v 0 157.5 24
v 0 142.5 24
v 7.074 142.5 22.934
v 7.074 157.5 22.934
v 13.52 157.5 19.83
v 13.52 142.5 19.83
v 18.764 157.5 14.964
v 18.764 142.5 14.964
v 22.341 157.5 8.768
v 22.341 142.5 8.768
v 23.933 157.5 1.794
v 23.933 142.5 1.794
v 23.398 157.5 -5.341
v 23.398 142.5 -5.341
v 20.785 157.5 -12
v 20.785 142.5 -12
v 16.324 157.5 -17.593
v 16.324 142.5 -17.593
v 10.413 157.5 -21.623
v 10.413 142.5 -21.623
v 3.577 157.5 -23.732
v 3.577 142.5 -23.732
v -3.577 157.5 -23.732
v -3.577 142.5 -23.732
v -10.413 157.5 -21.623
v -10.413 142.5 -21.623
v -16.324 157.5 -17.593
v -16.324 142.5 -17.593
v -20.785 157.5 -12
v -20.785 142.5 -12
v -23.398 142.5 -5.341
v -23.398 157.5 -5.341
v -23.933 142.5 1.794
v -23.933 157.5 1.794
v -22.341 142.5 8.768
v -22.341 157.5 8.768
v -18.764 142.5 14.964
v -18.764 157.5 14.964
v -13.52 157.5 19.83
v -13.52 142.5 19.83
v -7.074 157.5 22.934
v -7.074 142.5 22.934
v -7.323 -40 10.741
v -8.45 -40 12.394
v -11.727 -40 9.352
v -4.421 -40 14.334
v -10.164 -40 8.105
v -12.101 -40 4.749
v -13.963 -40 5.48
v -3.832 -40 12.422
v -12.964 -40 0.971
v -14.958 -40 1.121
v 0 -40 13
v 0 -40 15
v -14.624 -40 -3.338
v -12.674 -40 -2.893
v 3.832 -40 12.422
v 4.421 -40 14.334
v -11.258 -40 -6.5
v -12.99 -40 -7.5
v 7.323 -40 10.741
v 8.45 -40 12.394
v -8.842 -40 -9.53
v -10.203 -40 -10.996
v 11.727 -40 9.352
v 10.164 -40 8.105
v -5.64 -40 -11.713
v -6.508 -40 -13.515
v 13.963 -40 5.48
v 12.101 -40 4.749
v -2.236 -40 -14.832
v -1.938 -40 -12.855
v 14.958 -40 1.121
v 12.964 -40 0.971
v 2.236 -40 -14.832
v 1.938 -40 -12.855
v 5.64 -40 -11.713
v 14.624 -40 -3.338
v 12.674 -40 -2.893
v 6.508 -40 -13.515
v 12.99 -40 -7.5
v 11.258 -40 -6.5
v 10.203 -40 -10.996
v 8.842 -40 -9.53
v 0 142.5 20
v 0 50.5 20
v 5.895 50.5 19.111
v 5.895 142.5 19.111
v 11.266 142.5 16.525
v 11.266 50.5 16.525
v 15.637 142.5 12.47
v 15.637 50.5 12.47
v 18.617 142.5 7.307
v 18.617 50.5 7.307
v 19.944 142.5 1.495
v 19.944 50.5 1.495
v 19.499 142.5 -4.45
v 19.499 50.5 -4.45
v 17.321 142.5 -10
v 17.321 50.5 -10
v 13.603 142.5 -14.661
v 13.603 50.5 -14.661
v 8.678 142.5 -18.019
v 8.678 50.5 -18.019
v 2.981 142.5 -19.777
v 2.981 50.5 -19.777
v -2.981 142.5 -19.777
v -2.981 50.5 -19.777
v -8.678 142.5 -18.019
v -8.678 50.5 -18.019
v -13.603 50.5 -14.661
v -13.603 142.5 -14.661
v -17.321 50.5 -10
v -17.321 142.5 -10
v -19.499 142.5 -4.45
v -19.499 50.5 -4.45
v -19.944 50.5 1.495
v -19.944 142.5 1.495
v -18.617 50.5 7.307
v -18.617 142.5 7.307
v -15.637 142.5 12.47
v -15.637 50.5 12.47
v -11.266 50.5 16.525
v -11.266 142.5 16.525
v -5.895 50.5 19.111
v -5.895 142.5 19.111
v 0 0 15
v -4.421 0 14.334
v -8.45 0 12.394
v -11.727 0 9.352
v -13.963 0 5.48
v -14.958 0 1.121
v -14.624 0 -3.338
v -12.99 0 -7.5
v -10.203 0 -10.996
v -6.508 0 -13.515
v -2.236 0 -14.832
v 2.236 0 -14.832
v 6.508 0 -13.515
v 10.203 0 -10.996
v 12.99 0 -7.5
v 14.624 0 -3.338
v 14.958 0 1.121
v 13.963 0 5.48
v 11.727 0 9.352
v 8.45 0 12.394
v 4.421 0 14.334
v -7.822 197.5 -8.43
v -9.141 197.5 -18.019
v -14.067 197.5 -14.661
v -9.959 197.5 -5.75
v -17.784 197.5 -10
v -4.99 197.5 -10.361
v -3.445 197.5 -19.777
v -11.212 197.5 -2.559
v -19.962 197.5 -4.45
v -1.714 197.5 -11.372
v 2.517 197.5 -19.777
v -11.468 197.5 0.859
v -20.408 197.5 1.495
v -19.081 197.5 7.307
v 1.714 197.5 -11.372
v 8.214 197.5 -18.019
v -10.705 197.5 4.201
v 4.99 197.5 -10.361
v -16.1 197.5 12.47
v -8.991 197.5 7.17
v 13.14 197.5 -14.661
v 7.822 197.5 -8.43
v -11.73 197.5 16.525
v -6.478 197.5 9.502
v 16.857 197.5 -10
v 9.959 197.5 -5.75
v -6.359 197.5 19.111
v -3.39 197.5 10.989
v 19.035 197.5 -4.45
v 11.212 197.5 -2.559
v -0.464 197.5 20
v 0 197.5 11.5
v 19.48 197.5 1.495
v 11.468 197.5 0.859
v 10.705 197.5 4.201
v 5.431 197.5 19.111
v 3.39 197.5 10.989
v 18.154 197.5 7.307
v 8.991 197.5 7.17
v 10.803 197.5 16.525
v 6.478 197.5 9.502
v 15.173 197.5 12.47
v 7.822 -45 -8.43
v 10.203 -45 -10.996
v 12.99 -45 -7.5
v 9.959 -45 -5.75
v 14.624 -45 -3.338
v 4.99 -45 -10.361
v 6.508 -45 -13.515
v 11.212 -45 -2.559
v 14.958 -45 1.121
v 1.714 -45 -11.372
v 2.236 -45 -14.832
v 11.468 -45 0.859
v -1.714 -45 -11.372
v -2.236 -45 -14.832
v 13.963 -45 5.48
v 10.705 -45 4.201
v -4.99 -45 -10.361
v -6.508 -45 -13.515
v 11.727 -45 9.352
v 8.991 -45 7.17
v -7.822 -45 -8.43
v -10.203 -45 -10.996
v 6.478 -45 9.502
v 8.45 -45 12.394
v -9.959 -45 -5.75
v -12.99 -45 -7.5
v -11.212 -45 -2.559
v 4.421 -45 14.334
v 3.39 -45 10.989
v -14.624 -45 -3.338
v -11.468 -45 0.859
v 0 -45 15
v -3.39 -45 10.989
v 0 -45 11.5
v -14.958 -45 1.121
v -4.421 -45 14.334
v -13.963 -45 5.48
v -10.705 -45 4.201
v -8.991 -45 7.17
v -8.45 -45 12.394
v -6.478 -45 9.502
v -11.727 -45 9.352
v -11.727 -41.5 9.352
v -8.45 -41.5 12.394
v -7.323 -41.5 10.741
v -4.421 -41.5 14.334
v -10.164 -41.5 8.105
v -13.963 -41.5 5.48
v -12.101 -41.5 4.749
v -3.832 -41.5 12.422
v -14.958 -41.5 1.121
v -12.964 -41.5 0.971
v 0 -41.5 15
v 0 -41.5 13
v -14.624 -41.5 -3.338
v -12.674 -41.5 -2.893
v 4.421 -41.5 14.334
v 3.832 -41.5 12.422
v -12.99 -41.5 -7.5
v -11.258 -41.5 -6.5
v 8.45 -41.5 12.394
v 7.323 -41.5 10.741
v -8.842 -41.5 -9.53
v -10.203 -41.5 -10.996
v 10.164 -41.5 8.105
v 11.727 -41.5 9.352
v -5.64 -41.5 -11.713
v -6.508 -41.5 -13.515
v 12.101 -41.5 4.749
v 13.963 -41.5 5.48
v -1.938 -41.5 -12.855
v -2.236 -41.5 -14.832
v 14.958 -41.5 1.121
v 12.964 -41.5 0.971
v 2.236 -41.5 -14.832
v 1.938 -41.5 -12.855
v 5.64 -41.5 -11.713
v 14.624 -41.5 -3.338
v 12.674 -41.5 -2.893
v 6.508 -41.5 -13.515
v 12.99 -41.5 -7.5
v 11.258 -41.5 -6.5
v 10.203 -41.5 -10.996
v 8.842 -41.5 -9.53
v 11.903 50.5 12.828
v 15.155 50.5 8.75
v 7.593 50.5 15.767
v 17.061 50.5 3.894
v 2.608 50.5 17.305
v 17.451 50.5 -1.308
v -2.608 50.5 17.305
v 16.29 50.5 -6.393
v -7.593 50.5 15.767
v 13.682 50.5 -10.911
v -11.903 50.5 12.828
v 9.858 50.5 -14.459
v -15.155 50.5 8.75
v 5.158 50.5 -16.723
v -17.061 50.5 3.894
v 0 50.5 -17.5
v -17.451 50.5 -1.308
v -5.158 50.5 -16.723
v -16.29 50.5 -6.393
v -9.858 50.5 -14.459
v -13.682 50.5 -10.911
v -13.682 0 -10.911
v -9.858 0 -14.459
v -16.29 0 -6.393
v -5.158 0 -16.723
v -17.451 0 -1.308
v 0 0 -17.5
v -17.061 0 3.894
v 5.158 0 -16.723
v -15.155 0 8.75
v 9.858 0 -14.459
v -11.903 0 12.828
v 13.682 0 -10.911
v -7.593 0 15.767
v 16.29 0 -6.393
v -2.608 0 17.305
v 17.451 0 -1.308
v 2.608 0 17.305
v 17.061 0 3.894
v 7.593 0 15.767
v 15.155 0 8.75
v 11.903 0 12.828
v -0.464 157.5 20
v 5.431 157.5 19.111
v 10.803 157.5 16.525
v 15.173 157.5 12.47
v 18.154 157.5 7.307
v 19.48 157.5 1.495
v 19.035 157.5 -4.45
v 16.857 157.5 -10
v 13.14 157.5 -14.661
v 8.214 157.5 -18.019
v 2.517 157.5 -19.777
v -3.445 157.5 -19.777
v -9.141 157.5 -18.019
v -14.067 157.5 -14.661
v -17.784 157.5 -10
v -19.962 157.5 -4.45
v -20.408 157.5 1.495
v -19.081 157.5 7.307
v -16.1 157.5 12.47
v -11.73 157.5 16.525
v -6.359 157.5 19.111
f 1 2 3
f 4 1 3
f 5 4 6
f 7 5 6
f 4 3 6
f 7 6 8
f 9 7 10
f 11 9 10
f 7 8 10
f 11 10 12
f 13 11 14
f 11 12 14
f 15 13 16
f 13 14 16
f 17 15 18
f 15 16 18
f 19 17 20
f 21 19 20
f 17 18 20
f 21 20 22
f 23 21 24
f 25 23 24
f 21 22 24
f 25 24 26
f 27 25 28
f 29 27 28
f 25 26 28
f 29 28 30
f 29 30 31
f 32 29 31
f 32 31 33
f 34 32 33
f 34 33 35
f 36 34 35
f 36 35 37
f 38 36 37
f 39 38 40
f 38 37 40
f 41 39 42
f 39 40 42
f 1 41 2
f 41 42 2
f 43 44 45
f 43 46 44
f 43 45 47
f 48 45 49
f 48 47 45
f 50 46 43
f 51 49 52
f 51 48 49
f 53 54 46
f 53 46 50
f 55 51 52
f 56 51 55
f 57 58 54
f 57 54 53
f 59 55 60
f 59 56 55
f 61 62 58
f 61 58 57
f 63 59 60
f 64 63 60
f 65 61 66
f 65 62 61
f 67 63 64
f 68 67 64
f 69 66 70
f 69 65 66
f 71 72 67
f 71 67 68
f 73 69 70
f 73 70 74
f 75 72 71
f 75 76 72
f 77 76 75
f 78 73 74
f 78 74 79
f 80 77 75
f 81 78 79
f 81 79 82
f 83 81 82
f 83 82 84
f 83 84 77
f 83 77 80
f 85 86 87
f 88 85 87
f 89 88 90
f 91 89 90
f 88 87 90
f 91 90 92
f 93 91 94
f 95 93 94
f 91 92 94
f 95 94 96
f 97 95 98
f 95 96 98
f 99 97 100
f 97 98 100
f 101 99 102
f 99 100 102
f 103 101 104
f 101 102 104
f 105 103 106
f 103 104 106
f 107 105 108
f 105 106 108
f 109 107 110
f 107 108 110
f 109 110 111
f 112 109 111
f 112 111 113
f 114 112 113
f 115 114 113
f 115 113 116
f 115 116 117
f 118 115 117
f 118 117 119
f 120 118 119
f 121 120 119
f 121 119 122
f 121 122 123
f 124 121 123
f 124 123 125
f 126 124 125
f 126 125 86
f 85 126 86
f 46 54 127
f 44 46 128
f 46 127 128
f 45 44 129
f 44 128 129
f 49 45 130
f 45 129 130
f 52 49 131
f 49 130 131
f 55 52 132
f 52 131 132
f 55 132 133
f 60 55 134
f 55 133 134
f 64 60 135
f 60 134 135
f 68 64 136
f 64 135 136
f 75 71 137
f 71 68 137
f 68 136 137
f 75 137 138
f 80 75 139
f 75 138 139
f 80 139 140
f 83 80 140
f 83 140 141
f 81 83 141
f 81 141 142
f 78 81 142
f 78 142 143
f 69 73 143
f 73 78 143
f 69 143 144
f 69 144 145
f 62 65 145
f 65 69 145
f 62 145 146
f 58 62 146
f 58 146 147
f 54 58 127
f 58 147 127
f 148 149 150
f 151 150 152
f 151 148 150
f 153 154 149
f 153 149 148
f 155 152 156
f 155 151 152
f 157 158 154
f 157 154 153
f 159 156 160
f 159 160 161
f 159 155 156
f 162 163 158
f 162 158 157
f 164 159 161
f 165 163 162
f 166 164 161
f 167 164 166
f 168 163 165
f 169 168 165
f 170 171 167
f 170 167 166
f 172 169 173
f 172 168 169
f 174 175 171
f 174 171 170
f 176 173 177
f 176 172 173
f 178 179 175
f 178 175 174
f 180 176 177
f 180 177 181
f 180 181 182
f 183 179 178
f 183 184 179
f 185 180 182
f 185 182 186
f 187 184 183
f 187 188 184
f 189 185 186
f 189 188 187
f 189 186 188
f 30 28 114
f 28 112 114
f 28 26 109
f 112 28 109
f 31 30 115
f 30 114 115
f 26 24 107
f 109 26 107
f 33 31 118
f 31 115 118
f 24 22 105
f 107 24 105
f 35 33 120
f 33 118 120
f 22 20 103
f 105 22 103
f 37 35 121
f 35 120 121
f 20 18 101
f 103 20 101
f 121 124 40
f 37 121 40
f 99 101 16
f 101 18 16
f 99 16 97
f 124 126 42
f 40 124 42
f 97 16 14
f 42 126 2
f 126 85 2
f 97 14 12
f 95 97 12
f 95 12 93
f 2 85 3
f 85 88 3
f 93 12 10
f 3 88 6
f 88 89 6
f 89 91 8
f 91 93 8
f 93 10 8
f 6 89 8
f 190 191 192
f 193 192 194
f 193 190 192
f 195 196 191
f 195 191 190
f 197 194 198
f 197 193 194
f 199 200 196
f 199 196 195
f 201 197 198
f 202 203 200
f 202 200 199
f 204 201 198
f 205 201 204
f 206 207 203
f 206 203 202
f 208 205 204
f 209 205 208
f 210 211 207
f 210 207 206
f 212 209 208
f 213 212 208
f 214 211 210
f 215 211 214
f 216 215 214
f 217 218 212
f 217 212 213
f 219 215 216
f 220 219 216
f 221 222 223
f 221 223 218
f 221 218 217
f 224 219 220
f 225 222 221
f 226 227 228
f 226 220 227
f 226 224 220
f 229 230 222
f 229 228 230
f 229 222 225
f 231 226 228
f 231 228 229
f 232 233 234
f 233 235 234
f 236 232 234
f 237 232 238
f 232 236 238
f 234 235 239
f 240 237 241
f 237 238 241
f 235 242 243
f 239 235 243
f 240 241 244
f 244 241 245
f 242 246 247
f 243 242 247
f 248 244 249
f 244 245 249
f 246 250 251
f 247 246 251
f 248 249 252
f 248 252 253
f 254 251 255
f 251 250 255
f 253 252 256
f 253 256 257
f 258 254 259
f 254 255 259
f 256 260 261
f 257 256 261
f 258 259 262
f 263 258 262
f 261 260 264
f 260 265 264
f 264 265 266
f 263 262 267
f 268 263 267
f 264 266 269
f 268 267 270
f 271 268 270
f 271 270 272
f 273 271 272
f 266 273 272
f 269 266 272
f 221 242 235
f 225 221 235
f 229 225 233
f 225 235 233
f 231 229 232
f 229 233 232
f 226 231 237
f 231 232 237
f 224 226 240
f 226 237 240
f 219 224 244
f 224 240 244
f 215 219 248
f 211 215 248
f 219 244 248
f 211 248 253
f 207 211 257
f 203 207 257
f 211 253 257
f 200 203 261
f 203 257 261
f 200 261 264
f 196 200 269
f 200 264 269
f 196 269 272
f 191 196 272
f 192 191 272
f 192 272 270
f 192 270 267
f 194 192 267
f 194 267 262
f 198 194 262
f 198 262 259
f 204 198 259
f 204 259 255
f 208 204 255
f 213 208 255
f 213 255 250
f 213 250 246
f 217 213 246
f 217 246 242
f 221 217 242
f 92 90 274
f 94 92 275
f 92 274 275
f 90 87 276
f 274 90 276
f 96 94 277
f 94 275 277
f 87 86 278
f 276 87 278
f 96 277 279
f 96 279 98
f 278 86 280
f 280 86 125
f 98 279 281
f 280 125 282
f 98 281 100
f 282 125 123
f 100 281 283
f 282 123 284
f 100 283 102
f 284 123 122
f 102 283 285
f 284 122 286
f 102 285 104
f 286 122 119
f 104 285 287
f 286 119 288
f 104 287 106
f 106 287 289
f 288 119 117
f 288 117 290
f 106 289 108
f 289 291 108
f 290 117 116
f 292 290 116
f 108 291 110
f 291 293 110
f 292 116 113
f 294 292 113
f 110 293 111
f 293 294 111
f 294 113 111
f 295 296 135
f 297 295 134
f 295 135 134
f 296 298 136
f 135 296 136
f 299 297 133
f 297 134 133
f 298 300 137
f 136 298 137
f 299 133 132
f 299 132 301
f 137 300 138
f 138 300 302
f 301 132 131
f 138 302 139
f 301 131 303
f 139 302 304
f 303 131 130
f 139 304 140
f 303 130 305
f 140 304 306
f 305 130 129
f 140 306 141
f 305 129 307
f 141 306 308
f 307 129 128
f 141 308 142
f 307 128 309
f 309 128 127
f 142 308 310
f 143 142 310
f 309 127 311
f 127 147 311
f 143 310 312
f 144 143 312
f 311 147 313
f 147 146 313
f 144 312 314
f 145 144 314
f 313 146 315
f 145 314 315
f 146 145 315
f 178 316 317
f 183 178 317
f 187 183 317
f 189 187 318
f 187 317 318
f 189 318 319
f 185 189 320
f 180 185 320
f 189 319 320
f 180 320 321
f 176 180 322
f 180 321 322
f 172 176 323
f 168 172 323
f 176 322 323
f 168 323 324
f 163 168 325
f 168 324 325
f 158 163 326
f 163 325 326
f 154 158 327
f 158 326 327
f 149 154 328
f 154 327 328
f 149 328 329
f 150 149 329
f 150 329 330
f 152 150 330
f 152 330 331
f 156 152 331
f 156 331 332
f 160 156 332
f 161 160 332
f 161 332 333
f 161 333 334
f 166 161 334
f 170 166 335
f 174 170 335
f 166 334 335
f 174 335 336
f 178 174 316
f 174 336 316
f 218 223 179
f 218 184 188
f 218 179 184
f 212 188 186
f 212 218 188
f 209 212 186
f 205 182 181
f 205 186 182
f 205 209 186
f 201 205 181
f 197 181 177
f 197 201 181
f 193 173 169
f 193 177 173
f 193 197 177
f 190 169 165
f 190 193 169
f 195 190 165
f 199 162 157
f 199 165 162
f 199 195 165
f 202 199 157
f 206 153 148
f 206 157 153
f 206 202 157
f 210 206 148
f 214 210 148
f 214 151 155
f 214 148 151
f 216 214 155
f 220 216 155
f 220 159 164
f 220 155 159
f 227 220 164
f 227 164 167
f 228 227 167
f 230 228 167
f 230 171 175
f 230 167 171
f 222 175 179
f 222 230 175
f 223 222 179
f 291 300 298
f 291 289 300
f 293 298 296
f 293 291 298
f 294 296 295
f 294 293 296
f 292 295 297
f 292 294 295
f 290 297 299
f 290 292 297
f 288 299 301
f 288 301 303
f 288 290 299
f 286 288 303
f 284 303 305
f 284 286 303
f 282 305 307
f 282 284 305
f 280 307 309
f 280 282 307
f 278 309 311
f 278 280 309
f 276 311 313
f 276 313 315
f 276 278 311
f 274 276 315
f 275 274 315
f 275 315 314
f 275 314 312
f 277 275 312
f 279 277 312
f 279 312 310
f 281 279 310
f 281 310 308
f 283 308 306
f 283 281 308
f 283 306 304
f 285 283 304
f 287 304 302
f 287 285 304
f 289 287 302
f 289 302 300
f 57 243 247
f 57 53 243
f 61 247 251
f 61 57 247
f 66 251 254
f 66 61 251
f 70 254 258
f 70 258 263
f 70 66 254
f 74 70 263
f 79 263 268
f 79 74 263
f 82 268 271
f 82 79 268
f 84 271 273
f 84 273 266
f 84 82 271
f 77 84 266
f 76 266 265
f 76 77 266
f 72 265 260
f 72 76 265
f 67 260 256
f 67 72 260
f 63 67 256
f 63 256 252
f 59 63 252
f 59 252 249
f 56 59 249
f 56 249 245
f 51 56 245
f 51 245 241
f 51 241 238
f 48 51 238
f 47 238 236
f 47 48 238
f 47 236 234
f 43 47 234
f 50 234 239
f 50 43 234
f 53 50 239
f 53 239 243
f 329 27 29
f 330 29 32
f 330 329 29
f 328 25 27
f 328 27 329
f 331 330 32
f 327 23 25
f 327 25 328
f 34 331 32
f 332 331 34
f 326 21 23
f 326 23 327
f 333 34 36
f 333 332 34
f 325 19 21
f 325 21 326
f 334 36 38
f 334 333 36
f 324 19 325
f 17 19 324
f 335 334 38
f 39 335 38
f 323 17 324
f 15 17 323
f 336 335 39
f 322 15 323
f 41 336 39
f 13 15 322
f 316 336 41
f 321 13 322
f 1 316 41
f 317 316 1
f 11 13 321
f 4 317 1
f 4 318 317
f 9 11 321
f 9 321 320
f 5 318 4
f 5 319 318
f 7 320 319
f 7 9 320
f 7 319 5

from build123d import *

# Parameters (mm, degrees)
SKETCH1_R               = 20
BOSS_EXTRUDE1_DEPTH     = 142.5
SKETCH2_R               = 24
BOSS_EXTRUDE2_DEPTH     = 15
SKETCH3_R               = 20
BOSS_EXTRUDE3_DEPTH     = 40
SKETCH5_R               = 15
BOSS_EXTRUDE4_DEPTH     = 45
CUT_EXTRUDE1_DEPTH      = 245.863737617
CUT_EXTRUDE1_DEPTH_BACK = 245.863737617
SKETCH4_R               = 11.5
SKETCH7_W               = 2
SKETCH7_H               = 1.5
SKETCH10_W              = 2.5
SKETCH10_H              = 50.5


with BuildPart() as part:
    # Sketch1 → Boss-Extrude1 (new body)
    with BuildSketch(Plane(origin=(0, 0, 0), x_dir=(1, 0, 0), z_dir=(0, 1, 0))):
        with Locations(Location((0, 0, 0), (0, 0, 270))):
            Circle(SKETCH1_R)
    extrude(amount=BOSS_EXTRUDE1_DEPTH)

    # Sketch2 → Boss-Extrude2 (add)
    with BuildSketch(Plane(origin=(0, 142.5, 0), x_dir=(1, 0, 0), z_dir=(0, 1, 0))):
        with Locations(Location((0, 0, 0), (0, 0, 270))):
            Circle(SKETCH2_R)
    extrude(amount=BOSS_EXTRUDE2_DEPTH)

    # Sketch3 → Boss-Extrude3 (add)
    with BuildSketch(Plane(origin=(0, 157.5, 0), x_dir=(1, 0, 0), z_dir=(0, 1, 0))):
        with Locations(Location((-0.463755605, 0, 0), (0, 0, 270))):
            Circle(SKETCH3_R)
    extrude(amount=BOSS_EXTRUDE3_DEPTH)

    # Sketch5 → Boss-Extrude4 (add)
    with BuildSketch(Plane.XZ):
        with Locations(Location((0, 0, 0), (0, 0, 90))):
            Circle(SKETCH5_R)
    extrude(amount=BOSS_EXTRUDE4_DEPTH)

    # Sketch4 → Cut-Extrude1 (cut, two sides: drawn at the far end of the back side and taken through both)
    with BuildSketch(Plane(origin=(0, 197.5, 0), x_dir=(1, 0, 0), z_dir=(0, 1, 0)).offset(-CUT_EXTRUDE1_DEPTH_BACK)):
        with Locations(Location((0, 0, 0), (0, 0, 270))):
            Circle(SKETCH4_R)
    extrude(amount=CUT_EXTRUDE1_DEPTH + CUT_EXTRUDE1_DEPTH_BACK, mode=Mode.SUBTRACT)

    # Sketch7 → Cut-Revolve1 (revolve, cut)
    with BuildSketch(Plane(origin=(0, 0, 0), x_dir=(0, 0, -1), z_dir=(1, 0, 0)), mode=Mode.PRIVATE) as cut_revolve1_sk:
        with Locations((14, -40.75)):
            Rectangle(SKETCH7_W, SKETCH7_H)
    revolve(cut_revolve1_sk.sketch.rotate(Axis((0, -40.130931017, 0), (0, 1, 0)), 180), axis=Axis((0, -40.130931017, 0), (0, 1, 0)), mode=Mode.SUBTRACT)

    # Sketch10 → Cut-Revolve2 (revolve, cut)
    with BuildSketch(Plane.XY, mode=Mode.PRIVATE) as cut_revolve2_sk:
        with Locations((-18.75, 25.25)):
            Rectangle(SKETCH10_W, SKETCH10_H)
    revolve(cut_revolve2_sk.sketch.rotate(Axis((0, -22.168396133, 0), (0, 1, 0)), 270), axis=Axis((0, -22.168396133, 0), (0, 1, 0)), mode=Mode.SUBTRACT)


solid = part.part
